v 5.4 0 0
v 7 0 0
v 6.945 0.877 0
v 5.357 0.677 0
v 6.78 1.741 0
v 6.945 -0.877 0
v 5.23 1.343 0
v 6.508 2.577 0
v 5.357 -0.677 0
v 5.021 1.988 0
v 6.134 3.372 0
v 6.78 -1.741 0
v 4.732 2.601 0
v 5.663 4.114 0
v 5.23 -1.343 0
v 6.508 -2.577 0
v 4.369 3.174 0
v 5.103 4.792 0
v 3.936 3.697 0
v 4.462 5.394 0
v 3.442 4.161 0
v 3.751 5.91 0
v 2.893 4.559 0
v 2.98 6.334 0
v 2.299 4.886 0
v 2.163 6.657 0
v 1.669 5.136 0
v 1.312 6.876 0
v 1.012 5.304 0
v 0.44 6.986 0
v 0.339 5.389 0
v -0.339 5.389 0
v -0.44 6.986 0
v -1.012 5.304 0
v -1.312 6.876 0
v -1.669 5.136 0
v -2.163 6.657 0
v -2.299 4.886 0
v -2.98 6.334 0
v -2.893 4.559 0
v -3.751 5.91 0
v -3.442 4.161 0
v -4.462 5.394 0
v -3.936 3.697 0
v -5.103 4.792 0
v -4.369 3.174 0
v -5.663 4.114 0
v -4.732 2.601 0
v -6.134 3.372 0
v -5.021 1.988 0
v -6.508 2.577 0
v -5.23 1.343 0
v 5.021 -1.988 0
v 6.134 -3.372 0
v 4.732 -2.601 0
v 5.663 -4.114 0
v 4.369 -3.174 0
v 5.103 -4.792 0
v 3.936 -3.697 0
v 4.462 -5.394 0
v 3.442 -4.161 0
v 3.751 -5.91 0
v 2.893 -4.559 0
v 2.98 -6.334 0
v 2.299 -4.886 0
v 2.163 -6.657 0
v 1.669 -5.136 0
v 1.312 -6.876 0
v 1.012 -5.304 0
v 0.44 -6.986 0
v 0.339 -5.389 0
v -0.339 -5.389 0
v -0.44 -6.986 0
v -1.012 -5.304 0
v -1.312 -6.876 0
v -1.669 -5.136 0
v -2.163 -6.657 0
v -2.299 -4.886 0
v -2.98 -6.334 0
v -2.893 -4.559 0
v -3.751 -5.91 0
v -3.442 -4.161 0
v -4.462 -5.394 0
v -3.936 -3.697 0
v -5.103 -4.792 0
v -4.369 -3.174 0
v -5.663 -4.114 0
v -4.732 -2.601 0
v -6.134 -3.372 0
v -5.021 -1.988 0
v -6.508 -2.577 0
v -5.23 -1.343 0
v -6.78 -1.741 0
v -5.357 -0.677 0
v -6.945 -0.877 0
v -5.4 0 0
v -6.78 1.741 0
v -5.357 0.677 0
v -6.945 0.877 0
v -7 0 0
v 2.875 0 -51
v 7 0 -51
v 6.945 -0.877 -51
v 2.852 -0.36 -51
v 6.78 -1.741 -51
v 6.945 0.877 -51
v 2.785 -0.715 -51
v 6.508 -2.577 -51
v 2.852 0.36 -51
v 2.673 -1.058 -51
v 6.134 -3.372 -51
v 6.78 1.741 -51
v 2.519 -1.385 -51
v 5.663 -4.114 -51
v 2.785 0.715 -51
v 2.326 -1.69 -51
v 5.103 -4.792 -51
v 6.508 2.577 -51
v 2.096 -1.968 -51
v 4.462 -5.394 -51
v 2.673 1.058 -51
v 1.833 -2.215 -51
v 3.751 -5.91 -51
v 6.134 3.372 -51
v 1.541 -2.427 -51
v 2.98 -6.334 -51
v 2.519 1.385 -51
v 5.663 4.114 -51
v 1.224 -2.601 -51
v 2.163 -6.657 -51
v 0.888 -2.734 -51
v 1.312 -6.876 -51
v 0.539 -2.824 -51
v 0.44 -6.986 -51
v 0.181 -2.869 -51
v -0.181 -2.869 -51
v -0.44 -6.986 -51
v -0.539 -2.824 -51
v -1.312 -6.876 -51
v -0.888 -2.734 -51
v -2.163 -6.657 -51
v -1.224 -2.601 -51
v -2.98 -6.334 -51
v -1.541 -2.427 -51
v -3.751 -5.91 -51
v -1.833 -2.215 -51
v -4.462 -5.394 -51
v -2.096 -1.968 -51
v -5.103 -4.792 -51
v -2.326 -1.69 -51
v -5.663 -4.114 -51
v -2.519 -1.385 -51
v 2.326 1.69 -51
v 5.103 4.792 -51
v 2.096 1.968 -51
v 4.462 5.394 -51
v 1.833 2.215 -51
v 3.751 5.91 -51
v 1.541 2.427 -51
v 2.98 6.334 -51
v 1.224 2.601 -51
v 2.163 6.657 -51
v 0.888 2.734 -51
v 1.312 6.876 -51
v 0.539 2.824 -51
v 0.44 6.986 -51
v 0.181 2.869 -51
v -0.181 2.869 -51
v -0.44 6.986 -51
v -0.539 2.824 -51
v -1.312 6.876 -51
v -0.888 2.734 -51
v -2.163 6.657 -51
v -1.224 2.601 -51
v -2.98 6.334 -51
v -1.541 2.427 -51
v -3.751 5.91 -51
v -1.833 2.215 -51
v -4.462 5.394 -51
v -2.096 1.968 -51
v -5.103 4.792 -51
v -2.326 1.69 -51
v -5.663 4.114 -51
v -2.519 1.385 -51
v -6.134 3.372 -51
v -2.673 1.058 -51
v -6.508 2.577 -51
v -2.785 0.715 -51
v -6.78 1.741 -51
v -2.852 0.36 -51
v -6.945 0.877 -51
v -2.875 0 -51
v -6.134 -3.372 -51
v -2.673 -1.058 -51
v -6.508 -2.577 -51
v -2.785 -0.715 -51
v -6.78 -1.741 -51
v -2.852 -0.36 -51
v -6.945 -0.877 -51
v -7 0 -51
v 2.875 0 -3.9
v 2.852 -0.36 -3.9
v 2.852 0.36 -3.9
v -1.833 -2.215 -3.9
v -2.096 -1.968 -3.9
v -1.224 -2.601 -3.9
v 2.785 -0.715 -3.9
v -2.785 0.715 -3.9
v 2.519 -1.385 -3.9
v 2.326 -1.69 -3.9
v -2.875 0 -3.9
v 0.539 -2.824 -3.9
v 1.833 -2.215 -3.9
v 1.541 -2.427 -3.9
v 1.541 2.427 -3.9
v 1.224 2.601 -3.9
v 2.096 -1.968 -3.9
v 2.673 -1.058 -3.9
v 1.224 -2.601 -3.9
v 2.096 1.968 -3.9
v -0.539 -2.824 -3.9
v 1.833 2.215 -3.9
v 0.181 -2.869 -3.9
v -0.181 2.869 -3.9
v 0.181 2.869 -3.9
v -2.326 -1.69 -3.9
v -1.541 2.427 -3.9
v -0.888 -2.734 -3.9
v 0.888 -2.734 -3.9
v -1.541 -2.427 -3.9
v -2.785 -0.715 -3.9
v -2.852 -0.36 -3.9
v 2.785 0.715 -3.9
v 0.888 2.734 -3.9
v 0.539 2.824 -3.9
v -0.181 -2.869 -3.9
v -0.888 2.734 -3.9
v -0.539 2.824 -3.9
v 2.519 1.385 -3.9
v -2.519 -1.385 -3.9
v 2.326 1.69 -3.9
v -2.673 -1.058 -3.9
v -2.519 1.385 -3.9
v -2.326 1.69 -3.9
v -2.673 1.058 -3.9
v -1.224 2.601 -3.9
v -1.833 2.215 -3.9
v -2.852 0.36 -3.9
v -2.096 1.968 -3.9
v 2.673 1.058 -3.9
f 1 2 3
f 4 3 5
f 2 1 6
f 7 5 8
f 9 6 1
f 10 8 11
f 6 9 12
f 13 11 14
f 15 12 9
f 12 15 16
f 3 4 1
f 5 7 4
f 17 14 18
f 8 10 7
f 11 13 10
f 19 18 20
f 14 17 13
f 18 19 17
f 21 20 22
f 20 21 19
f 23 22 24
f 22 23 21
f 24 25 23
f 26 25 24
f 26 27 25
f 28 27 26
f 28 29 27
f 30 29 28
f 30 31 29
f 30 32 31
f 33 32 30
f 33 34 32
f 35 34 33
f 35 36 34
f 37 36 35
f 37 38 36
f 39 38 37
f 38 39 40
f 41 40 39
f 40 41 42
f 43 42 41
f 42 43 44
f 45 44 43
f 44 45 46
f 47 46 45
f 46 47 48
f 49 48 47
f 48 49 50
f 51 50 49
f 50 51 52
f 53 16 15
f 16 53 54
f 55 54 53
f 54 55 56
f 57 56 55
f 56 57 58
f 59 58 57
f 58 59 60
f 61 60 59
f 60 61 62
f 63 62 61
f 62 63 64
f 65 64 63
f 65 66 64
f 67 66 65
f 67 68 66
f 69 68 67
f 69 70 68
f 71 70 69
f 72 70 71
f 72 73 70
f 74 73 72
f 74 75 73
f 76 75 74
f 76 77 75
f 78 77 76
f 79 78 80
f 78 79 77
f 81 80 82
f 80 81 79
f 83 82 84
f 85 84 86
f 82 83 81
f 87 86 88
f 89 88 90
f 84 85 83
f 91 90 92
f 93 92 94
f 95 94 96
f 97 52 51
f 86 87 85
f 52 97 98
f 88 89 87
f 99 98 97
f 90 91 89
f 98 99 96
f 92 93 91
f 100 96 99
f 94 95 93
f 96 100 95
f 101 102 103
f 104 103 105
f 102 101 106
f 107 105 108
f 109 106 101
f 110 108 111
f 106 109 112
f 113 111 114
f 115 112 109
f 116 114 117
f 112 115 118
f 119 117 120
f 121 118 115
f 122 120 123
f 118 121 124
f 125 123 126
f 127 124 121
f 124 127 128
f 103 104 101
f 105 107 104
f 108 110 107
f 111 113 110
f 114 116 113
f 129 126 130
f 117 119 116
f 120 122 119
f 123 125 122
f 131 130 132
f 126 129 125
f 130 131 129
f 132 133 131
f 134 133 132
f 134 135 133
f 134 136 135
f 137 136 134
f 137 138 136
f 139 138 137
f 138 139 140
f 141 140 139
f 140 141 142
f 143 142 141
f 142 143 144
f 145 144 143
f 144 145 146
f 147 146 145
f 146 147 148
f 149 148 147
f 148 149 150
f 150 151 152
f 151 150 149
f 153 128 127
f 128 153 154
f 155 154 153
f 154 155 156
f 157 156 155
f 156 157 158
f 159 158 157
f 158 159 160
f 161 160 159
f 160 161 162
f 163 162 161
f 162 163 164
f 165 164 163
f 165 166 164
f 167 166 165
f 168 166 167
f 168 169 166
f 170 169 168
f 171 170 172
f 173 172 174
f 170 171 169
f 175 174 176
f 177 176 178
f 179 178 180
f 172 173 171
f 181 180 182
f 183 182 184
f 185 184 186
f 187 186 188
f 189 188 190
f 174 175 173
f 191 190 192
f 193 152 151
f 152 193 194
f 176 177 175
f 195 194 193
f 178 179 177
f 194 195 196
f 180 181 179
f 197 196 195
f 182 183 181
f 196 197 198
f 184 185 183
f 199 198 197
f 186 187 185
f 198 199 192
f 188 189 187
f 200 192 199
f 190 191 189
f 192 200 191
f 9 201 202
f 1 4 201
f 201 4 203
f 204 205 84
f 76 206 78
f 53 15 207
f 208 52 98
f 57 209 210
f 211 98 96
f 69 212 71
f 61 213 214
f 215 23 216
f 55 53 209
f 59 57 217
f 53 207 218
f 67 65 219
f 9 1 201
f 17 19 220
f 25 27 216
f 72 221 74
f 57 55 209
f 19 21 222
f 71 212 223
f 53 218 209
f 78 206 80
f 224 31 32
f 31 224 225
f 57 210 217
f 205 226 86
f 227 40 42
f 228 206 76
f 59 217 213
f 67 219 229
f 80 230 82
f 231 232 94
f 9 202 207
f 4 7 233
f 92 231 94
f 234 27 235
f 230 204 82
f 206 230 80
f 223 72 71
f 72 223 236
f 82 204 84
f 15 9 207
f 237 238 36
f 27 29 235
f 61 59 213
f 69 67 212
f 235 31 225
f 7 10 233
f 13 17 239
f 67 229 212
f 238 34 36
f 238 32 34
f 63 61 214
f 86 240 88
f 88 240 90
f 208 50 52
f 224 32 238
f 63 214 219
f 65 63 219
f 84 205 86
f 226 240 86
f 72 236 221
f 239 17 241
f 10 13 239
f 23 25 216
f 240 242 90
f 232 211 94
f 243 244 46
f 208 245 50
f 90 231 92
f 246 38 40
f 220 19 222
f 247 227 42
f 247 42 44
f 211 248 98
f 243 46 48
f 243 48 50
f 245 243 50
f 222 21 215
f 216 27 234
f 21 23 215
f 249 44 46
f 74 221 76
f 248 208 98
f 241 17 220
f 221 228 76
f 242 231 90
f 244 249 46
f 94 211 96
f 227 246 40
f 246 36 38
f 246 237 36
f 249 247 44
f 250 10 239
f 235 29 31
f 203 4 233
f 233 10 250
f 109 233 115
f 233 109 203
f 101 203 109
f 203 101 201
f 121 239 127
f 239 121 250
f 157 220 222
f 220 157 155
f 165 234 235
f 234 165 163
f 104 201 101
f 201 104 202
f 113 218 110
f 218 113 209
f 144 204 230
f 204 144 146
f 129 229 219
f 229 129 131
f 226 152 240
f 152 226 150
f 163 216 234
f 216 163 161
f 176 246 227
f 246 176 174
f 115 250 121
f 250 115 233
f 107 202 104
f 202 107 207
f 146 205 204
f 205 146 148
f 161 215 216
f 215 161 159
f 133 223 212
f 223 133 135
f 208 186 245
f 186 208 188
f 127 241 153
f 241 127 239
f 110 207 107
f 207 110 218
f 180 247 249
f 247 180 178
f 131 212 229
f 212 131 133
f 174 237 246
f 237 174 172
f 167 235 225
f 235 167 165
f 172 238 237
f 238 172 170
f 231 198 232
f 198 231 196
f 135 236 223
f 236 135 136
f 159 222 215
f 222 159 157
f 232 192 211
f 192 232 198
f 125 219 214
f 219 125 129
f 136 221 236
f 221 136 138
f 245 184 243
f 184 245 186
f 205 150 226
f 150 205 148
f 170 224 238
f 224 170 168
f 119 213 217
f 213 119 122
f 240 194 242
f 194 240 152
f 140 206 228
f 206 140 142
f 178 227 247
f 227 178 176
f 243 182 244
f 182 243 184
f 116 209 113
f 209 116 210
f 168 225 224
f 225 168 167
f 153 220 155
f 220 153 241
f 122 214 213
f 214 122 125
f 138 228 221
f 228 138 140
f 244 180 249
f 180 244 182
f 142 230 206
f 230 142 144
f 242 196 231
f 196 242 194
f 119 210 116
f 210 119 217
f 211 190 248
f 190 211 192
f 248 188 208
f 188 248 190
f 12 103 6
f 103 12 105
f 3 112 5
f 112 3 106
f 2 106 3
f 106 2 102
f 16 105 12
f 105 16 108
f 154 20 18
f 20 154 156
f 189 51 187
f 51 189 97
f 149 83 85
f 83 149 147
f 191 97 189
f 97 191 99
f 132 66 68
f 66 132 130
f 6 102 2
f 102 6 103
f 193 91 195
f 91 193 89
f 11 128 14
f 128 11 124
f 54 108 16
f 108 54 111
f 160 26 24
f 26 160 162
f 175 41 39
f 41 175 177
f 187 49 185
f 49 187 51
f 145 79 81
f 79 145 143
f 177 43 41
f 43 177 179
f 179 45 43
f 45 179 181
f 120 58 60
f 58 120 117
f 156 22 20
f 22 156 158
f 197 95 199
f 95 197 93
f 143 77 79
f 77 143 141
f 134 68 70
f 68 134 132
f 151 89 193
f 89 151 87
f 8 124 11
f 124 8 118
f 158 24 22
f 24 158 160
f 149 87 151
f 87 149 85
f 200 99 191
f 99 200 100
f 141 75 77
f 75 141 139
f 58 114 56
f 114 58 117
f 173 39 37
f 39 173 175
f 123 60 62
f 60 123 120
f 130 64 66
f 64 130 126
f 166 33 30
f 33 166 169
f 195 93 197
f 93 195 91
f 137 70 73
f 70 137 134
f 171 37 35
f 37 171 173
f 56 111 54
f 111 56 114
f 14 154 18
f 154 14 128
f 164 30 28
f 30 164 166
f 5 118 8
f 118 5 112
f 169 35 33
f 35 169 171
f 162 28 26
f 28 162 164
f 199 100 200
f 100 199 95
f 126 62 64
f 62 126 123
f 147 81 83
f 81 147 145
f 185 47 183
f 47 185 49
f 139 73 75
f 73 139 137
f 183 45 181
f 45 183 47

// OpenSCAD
$fn = 50;


difference() {
	union() {
		translate(v = [0, 0, -51.0000000000]) {
			cylinder(h = 51, r = 7.0000000000);
		}
		cylinder(h = 0, r = 17.0000000000);
	}
	union() {
		translate(v = [0, 0, 0]) {
			rotate(a = [0, 0, 0]) {
				difference() {
					union() {
						#translate(v = [0, 0, -51.0000000000]) {
							cylinder(h = 51, r = 2.6000000000);
						}
						#translate(v = [0, 0, -3.9000000000]) {
							cylinder(h = 3.9000000000, r1 = 2.8750000000, r2 = 5.4000000000);
						}
						#translate(v = [0, 0, -51.0000000000]) {
							cylinder(h = 51, r = 2.8750000000);
						}
						#translate(v = [0, 0, -51.0000000000]) {
							cylinder(h = 51, r = 2.6000000000);
						}
					}
					union();
				}
			}
		}
	}
}
